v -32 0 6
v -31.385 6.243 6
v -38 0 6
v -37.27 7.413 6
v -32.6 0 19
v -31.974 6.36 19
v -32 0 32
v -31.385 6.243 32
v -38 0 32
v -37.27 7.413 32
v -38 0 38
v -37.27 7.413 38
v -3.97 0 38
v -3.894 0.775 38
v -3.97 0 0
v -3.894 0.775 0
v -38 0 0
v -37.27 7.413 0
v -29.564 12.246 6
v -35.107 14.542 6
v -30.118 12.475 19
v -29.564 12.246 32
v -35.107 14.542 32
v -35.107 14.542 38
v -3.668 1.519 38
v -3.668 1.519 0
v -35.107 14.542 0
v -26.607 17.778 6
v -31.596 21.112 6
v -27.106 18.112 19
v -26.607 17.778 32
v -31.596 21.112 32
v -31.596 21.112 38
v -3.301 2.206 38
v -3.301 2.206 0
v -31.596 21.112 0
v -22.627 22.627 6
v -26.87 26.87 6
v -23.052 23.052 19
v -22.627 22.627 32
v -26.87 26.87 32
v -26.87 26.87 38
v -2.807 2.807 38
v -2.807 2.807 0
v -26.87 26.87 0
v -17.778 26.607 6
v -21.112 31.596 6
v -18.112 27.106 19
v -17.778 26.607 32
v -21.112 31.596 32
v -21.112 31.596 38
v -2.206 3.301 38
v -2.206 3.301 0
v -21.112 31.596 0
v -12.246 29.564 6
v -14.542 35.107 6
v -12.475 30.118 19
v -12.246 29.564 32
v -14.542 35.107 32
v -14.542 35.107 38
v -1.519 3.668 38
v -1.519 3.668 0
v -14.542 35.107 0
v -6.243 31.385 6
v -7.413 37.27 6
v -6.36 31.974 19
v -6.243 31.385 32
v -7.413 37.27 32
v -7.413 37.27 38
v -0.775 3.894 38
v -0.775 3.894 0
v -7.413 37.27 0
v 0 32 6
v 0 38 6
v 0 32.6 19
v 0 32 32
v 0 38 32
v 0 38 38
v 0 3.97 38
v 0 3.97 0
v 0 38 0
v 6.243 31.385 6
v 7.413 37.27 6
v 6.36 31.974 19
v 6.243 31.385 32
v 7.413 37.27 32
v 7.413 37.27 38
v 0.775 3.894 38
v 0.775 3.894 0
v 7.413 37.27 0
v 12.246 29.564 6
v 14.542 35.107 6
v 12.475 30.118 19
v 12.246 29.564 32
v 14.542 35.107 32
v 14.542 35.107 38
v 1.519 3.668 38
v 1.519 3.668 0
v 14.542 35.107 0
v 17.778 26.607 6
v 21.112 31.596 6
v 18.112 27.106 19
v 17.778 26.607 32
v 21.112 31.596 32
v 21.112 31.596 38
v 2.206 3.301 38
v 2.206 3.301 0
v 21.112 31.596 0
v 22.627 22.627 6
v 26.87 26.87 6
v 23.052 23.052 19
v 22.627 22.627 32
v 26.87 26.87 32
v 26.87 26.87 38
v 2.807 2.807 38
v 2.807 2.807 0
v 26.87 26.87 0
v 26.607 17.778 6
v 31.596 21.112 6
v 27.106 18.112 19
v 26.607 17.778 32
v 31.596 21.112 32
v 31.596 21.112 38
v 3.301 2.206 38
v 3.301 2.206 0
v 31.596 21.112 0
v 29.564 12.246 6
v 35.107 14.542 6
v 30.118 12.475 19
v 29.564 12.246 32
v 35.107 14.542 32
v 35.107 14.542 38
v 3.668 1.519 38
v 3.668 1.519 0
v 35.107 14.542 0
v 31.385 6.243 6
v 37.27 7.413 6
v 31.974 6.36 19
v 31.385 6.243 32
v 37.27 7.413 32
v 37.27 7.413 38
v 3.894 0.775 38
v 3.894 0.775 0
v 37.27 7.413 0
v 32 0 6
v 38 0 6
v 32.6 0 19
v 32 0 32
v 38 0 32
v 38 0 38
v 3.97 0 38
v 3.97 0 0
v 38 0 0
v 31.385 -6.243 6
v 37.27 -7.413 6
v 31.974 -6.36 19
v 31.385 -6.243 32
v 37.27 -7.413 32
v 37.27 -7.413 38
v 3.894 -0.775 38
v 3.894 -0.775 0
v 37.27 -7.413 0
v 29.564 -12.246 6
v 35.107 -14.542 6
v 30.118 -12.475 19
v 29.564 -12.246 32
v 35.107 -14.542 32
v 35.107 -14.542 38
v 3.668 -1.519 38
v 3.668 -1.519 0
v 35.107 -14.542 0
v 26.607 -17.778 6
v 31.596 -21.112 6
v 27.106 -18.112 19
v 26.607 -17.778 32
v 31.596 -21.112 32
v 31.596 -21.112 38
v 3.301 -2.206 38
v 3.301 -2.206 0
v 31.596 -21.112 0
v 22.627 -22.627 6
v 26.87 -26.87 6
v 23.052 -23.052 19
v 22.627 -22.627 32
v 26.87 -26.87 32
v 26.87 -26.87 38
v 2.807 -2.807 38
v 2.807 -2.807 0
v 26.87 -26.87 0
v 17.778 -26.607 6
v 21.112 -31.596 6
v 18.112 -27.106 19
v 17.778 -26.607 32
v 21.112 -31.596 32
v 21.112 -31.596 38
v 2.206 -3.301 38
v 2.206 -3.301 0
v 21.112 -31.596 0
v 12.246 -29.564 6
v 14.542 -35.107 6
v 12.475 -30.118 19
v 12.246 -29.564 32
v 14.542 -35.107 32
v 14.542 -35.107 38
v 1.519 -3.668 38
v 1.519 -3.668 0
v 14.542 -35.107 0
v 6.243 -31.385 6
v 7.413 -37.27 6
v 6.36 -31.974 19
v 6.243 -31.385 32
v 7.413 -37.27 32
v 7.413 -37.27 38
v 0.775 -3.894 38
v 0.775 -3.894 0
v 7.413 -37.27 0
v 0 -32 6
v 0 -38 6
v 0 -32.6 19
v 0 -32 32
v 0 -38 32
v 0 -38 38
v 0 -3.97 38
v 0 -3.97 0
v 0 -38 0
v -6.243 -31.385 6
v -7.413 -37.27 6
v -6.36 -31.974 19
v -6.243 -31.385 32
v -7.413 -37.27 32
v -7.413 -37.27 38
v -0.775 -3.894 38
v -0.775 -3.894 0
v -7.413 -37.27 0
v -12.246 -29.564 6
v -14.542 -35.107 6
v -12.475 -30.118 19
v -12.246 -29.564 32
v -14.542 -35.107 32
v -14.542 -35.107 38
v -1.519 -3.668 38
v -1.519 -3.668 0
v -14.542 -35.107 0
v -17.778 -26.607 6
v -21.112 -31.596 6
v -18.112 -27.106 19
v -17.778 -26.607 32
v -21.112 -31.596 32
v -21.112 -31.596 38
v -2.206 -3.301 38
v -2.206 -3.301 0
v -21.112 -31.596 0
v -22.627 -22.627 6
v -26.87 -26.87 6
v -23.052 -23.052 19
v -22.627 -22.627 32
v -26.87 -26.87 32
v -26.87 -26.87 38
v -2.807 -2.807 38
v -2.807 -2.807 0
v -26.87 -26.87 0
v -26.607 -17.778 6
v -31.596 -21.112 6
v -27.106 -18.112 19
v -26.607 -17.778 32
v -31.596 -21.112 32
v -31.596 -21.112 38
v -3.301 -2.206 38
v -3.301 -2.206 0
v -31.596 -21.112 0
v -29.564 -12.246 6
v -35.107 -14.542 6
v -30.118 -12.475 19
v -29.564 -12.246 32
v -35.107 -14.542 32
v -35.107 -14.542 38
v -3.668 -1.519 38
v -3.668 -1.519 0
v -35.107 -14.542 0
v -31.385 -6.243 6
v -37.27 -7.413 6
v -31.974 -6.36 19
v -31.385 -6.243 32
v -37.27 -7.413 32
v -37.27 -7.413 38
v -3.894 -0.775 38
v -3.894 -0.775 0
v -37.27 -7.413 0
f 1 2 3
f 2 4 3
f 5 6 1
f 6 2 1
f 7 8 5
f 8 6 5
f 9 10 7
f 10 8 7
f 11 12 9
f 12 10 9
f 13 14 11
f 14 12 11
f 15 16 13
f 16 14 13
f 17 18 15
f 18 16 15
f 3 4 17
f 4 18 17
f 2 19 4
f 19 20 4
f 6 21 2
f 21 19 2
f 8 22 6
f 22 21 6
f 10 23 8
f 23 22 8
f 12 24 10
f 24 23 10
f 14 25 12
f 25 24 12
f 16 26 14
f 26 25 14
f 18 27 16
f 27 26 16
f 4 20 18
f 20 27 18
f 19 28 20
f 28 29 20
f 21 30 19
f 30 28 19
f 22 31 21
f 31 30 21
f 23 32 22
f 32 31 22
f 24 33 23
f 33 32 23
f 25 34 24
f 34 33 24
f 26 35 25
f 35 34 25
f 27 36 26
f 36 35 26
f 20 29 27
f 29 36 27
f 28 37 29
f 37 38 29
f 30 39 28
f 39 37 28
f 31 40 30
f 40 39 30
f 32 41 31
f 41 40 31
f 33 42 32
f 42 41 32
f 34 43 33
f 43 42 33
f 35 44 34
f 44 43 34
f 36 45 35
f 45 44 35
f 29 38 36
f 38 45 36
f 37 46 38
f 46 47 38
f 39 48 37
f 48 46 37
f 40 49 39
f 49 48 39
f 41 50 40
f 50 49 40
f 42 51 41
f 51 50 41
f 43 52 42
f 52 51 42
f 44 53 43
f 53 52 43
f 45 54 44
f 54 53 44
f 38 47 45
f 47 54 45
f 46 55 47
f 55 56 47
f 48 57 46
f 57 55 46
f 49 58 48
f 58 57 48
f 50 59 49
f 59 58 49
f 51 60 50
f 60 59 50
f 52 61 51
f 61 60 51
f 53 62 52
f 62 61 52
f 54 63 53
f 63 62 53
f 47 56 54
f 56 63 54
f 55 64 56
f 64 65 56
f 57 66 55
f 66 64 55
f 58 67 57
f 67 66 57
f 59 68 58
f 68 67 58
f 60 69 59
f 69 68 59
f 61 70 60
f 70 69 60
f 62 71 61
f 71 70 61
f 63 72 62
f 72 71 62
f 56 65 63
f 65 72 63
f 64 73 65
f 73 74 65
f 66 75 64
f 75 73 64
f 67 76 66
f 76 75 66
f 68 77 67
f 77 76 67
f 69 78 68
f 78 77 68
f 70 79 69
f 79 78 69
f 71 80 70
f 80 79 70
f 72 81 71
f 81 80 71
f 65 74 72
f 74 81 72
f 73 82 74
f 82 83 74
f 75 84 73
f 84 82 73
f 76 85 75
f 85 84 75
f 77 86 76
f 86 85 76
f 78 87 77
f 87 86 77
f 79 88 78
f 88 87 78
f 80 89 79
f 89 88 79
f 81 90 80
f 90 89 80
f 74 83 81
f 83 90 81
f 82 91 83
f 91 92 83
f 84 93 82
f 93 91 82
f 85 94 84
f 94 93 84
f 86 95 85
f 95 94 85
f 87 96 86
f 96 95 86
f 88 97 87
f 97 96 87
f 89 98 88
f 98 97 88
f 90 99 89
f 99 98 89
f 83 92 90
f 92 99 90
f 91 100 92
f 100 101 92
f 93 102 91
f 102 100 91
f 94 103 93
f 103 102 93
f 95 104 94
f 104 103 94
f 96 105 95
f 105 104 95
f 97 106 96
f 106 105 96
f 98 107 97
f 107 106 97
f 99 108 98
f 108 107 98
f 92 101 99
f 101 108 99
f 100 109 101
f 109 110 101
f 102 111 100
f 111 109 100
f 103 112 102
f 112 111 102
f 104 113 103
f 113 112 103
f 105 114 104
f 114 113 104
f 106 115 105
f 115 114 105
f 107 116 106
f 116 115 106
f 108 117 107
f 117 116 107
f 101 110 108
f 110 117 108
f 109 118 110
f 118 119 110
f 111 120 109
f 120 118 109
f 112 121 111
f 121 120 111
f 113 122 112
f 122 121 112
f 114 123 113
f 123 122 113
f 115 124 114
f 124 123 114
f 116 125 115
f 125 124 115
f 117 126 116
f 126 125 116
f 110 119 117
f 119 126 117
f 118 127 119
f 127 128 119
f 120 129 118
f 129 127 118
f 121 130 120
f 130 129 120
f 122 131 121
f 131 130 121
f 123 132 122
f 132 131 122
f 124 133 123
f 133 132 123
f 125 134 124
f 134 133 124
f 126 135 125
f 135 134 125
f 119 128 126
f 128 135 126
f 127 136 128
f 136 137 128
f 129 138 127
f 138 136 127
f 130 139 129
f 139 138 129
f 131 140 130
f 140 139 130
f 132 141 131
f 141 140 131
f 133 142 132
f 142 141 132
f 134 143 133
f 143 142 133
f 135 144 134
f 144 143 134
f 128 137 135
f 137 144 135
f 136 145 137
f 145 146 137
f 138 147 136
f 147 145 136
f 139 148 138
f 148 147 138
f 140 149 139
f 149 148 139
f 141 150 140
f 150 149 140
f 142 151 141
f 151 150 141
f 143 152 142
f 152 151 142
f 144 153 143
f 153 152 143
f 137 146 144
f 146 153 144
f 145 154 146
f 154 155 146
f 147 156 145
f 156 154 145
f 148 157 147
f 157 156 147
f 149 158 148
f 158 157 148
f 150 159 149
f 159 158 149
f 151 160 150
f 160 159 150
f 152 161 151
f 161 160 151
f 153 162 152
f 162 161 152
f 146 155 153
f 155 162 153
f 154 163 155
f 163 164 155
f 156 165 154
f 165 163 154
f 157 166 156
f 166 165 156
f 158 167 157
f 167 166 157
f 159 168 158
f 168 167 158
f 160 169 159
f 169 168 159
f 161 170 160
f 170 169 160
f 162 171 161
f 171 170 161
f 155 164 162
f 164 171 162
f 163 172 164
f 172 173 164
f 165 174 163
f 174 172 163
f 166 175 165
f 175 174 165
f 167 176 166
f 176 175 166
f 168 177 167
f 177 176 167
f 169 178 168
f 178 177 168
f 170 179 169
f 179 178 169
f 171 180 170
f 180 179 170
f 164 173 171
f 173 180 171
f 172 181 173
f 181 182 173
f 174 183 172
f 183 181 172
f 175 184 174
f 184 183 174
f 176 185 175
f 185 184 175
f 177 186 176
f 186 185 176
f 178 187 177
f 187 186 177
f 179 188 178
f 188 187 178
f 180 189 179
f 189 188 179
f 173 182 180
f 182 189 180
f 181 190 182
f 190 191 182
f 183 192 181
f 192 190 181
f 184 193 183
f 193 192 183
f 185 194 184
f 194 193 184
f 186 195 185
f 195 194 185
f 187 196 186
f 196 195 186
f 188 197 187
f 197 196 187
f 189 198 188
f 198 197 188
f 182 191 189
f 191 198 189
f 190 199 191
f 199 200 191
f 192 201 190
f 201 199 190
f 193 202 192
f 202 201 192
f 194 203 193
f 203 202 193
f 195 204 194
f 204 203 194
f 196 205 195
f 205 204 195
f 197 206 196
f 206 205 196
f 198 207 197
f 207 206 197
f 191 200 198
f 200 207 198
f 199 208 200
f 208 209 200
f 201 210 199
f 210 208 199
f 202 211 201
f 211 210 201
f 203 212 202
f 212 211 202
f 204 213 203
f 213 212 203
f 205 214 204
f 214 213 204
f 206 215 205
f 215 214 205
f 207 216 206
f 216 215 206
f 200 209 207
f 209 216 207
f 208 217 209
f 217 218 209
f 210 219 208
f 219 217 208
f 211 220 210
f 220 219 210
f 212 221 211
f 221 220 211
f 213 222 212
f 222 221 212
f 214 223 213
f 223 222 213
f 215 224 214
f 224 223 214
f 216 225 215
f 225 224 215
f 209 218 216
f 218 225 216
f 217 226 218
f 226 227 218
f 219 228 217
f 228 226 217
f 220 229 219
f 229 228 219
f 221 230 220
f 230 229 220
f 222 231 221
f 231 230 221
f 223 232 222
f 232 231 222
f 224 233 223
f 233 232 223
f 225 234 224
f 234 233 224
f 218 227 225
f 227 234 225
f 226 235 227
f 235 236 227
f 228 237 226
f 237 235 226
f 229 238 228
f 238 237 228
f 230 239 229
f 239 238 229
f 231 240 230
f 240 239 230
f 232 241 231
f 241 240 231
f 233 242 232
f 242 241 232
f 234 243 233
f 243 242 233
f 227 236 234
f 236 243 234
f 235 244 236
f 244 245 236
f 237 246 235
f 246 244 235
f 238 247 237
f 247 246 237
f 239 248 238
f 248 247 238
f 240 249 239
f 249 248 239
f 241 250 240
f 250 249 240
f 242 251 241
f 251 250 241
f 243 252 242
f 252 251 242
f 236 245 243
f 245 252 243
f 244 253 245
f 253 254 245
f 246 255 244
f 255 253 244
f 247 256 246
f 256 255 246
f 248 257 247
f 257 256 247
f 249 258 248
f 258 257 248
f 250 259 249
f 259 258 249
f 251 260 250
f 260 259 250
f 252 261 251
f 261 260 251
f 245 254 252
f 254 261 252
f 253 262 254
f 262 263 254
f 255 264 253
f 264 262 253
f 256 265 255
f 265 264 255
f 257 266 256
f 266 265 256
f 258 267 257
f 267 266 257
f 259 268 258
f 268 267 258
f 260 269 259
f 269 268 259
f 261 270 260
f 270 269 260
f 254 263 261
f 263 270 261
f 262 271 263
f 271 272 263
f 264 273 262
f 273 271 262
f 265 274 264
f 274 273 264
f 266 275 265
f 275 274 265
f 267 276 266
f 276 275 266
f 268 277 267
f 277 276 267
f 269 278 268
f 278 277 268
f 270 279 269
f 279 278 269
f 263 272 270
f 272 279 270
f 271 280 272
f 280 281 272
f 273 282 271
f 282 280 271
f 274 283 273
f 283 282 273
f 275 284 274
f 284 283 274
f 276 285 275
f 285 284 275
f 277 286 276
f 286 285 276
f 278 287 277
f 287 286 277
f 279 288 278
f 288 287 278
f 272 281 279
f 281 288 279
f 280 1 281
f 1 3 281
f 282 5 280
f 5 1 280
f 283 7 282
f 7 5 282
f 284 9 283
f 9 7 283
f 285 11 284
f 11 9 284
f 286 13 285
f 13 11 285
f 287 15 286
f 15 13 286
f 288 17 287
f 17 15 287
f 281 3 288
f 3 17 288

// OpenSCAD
$fn = 32;

// ----------------------------------------------------------------------
// Belt roller: 64 mm barrel, 38 mm wide, bore 7.94 mm
// ----------------------------------------------------------------------

// --- parameters (mm) ---
bore_d = 7.94;            // bore
barrel_d = 64;            // barrel diameter
roller_w = 38;            // roller width
flange_d = 76;            // flange diameter
flange_t = 6;             // flange thickness
hub_d = 23.94;            // hub diameter

roller_profile = [[3.97, 0], [38, 0], [38, 6], [32, 6], [32.6, 19], [32, 32], [38, 32], [38, 38], [3.97, 38]];

/* the profile stays clear of the axis, so the bore comes out of the revolve */
rotate_extrude() polygon(roller_profile);
